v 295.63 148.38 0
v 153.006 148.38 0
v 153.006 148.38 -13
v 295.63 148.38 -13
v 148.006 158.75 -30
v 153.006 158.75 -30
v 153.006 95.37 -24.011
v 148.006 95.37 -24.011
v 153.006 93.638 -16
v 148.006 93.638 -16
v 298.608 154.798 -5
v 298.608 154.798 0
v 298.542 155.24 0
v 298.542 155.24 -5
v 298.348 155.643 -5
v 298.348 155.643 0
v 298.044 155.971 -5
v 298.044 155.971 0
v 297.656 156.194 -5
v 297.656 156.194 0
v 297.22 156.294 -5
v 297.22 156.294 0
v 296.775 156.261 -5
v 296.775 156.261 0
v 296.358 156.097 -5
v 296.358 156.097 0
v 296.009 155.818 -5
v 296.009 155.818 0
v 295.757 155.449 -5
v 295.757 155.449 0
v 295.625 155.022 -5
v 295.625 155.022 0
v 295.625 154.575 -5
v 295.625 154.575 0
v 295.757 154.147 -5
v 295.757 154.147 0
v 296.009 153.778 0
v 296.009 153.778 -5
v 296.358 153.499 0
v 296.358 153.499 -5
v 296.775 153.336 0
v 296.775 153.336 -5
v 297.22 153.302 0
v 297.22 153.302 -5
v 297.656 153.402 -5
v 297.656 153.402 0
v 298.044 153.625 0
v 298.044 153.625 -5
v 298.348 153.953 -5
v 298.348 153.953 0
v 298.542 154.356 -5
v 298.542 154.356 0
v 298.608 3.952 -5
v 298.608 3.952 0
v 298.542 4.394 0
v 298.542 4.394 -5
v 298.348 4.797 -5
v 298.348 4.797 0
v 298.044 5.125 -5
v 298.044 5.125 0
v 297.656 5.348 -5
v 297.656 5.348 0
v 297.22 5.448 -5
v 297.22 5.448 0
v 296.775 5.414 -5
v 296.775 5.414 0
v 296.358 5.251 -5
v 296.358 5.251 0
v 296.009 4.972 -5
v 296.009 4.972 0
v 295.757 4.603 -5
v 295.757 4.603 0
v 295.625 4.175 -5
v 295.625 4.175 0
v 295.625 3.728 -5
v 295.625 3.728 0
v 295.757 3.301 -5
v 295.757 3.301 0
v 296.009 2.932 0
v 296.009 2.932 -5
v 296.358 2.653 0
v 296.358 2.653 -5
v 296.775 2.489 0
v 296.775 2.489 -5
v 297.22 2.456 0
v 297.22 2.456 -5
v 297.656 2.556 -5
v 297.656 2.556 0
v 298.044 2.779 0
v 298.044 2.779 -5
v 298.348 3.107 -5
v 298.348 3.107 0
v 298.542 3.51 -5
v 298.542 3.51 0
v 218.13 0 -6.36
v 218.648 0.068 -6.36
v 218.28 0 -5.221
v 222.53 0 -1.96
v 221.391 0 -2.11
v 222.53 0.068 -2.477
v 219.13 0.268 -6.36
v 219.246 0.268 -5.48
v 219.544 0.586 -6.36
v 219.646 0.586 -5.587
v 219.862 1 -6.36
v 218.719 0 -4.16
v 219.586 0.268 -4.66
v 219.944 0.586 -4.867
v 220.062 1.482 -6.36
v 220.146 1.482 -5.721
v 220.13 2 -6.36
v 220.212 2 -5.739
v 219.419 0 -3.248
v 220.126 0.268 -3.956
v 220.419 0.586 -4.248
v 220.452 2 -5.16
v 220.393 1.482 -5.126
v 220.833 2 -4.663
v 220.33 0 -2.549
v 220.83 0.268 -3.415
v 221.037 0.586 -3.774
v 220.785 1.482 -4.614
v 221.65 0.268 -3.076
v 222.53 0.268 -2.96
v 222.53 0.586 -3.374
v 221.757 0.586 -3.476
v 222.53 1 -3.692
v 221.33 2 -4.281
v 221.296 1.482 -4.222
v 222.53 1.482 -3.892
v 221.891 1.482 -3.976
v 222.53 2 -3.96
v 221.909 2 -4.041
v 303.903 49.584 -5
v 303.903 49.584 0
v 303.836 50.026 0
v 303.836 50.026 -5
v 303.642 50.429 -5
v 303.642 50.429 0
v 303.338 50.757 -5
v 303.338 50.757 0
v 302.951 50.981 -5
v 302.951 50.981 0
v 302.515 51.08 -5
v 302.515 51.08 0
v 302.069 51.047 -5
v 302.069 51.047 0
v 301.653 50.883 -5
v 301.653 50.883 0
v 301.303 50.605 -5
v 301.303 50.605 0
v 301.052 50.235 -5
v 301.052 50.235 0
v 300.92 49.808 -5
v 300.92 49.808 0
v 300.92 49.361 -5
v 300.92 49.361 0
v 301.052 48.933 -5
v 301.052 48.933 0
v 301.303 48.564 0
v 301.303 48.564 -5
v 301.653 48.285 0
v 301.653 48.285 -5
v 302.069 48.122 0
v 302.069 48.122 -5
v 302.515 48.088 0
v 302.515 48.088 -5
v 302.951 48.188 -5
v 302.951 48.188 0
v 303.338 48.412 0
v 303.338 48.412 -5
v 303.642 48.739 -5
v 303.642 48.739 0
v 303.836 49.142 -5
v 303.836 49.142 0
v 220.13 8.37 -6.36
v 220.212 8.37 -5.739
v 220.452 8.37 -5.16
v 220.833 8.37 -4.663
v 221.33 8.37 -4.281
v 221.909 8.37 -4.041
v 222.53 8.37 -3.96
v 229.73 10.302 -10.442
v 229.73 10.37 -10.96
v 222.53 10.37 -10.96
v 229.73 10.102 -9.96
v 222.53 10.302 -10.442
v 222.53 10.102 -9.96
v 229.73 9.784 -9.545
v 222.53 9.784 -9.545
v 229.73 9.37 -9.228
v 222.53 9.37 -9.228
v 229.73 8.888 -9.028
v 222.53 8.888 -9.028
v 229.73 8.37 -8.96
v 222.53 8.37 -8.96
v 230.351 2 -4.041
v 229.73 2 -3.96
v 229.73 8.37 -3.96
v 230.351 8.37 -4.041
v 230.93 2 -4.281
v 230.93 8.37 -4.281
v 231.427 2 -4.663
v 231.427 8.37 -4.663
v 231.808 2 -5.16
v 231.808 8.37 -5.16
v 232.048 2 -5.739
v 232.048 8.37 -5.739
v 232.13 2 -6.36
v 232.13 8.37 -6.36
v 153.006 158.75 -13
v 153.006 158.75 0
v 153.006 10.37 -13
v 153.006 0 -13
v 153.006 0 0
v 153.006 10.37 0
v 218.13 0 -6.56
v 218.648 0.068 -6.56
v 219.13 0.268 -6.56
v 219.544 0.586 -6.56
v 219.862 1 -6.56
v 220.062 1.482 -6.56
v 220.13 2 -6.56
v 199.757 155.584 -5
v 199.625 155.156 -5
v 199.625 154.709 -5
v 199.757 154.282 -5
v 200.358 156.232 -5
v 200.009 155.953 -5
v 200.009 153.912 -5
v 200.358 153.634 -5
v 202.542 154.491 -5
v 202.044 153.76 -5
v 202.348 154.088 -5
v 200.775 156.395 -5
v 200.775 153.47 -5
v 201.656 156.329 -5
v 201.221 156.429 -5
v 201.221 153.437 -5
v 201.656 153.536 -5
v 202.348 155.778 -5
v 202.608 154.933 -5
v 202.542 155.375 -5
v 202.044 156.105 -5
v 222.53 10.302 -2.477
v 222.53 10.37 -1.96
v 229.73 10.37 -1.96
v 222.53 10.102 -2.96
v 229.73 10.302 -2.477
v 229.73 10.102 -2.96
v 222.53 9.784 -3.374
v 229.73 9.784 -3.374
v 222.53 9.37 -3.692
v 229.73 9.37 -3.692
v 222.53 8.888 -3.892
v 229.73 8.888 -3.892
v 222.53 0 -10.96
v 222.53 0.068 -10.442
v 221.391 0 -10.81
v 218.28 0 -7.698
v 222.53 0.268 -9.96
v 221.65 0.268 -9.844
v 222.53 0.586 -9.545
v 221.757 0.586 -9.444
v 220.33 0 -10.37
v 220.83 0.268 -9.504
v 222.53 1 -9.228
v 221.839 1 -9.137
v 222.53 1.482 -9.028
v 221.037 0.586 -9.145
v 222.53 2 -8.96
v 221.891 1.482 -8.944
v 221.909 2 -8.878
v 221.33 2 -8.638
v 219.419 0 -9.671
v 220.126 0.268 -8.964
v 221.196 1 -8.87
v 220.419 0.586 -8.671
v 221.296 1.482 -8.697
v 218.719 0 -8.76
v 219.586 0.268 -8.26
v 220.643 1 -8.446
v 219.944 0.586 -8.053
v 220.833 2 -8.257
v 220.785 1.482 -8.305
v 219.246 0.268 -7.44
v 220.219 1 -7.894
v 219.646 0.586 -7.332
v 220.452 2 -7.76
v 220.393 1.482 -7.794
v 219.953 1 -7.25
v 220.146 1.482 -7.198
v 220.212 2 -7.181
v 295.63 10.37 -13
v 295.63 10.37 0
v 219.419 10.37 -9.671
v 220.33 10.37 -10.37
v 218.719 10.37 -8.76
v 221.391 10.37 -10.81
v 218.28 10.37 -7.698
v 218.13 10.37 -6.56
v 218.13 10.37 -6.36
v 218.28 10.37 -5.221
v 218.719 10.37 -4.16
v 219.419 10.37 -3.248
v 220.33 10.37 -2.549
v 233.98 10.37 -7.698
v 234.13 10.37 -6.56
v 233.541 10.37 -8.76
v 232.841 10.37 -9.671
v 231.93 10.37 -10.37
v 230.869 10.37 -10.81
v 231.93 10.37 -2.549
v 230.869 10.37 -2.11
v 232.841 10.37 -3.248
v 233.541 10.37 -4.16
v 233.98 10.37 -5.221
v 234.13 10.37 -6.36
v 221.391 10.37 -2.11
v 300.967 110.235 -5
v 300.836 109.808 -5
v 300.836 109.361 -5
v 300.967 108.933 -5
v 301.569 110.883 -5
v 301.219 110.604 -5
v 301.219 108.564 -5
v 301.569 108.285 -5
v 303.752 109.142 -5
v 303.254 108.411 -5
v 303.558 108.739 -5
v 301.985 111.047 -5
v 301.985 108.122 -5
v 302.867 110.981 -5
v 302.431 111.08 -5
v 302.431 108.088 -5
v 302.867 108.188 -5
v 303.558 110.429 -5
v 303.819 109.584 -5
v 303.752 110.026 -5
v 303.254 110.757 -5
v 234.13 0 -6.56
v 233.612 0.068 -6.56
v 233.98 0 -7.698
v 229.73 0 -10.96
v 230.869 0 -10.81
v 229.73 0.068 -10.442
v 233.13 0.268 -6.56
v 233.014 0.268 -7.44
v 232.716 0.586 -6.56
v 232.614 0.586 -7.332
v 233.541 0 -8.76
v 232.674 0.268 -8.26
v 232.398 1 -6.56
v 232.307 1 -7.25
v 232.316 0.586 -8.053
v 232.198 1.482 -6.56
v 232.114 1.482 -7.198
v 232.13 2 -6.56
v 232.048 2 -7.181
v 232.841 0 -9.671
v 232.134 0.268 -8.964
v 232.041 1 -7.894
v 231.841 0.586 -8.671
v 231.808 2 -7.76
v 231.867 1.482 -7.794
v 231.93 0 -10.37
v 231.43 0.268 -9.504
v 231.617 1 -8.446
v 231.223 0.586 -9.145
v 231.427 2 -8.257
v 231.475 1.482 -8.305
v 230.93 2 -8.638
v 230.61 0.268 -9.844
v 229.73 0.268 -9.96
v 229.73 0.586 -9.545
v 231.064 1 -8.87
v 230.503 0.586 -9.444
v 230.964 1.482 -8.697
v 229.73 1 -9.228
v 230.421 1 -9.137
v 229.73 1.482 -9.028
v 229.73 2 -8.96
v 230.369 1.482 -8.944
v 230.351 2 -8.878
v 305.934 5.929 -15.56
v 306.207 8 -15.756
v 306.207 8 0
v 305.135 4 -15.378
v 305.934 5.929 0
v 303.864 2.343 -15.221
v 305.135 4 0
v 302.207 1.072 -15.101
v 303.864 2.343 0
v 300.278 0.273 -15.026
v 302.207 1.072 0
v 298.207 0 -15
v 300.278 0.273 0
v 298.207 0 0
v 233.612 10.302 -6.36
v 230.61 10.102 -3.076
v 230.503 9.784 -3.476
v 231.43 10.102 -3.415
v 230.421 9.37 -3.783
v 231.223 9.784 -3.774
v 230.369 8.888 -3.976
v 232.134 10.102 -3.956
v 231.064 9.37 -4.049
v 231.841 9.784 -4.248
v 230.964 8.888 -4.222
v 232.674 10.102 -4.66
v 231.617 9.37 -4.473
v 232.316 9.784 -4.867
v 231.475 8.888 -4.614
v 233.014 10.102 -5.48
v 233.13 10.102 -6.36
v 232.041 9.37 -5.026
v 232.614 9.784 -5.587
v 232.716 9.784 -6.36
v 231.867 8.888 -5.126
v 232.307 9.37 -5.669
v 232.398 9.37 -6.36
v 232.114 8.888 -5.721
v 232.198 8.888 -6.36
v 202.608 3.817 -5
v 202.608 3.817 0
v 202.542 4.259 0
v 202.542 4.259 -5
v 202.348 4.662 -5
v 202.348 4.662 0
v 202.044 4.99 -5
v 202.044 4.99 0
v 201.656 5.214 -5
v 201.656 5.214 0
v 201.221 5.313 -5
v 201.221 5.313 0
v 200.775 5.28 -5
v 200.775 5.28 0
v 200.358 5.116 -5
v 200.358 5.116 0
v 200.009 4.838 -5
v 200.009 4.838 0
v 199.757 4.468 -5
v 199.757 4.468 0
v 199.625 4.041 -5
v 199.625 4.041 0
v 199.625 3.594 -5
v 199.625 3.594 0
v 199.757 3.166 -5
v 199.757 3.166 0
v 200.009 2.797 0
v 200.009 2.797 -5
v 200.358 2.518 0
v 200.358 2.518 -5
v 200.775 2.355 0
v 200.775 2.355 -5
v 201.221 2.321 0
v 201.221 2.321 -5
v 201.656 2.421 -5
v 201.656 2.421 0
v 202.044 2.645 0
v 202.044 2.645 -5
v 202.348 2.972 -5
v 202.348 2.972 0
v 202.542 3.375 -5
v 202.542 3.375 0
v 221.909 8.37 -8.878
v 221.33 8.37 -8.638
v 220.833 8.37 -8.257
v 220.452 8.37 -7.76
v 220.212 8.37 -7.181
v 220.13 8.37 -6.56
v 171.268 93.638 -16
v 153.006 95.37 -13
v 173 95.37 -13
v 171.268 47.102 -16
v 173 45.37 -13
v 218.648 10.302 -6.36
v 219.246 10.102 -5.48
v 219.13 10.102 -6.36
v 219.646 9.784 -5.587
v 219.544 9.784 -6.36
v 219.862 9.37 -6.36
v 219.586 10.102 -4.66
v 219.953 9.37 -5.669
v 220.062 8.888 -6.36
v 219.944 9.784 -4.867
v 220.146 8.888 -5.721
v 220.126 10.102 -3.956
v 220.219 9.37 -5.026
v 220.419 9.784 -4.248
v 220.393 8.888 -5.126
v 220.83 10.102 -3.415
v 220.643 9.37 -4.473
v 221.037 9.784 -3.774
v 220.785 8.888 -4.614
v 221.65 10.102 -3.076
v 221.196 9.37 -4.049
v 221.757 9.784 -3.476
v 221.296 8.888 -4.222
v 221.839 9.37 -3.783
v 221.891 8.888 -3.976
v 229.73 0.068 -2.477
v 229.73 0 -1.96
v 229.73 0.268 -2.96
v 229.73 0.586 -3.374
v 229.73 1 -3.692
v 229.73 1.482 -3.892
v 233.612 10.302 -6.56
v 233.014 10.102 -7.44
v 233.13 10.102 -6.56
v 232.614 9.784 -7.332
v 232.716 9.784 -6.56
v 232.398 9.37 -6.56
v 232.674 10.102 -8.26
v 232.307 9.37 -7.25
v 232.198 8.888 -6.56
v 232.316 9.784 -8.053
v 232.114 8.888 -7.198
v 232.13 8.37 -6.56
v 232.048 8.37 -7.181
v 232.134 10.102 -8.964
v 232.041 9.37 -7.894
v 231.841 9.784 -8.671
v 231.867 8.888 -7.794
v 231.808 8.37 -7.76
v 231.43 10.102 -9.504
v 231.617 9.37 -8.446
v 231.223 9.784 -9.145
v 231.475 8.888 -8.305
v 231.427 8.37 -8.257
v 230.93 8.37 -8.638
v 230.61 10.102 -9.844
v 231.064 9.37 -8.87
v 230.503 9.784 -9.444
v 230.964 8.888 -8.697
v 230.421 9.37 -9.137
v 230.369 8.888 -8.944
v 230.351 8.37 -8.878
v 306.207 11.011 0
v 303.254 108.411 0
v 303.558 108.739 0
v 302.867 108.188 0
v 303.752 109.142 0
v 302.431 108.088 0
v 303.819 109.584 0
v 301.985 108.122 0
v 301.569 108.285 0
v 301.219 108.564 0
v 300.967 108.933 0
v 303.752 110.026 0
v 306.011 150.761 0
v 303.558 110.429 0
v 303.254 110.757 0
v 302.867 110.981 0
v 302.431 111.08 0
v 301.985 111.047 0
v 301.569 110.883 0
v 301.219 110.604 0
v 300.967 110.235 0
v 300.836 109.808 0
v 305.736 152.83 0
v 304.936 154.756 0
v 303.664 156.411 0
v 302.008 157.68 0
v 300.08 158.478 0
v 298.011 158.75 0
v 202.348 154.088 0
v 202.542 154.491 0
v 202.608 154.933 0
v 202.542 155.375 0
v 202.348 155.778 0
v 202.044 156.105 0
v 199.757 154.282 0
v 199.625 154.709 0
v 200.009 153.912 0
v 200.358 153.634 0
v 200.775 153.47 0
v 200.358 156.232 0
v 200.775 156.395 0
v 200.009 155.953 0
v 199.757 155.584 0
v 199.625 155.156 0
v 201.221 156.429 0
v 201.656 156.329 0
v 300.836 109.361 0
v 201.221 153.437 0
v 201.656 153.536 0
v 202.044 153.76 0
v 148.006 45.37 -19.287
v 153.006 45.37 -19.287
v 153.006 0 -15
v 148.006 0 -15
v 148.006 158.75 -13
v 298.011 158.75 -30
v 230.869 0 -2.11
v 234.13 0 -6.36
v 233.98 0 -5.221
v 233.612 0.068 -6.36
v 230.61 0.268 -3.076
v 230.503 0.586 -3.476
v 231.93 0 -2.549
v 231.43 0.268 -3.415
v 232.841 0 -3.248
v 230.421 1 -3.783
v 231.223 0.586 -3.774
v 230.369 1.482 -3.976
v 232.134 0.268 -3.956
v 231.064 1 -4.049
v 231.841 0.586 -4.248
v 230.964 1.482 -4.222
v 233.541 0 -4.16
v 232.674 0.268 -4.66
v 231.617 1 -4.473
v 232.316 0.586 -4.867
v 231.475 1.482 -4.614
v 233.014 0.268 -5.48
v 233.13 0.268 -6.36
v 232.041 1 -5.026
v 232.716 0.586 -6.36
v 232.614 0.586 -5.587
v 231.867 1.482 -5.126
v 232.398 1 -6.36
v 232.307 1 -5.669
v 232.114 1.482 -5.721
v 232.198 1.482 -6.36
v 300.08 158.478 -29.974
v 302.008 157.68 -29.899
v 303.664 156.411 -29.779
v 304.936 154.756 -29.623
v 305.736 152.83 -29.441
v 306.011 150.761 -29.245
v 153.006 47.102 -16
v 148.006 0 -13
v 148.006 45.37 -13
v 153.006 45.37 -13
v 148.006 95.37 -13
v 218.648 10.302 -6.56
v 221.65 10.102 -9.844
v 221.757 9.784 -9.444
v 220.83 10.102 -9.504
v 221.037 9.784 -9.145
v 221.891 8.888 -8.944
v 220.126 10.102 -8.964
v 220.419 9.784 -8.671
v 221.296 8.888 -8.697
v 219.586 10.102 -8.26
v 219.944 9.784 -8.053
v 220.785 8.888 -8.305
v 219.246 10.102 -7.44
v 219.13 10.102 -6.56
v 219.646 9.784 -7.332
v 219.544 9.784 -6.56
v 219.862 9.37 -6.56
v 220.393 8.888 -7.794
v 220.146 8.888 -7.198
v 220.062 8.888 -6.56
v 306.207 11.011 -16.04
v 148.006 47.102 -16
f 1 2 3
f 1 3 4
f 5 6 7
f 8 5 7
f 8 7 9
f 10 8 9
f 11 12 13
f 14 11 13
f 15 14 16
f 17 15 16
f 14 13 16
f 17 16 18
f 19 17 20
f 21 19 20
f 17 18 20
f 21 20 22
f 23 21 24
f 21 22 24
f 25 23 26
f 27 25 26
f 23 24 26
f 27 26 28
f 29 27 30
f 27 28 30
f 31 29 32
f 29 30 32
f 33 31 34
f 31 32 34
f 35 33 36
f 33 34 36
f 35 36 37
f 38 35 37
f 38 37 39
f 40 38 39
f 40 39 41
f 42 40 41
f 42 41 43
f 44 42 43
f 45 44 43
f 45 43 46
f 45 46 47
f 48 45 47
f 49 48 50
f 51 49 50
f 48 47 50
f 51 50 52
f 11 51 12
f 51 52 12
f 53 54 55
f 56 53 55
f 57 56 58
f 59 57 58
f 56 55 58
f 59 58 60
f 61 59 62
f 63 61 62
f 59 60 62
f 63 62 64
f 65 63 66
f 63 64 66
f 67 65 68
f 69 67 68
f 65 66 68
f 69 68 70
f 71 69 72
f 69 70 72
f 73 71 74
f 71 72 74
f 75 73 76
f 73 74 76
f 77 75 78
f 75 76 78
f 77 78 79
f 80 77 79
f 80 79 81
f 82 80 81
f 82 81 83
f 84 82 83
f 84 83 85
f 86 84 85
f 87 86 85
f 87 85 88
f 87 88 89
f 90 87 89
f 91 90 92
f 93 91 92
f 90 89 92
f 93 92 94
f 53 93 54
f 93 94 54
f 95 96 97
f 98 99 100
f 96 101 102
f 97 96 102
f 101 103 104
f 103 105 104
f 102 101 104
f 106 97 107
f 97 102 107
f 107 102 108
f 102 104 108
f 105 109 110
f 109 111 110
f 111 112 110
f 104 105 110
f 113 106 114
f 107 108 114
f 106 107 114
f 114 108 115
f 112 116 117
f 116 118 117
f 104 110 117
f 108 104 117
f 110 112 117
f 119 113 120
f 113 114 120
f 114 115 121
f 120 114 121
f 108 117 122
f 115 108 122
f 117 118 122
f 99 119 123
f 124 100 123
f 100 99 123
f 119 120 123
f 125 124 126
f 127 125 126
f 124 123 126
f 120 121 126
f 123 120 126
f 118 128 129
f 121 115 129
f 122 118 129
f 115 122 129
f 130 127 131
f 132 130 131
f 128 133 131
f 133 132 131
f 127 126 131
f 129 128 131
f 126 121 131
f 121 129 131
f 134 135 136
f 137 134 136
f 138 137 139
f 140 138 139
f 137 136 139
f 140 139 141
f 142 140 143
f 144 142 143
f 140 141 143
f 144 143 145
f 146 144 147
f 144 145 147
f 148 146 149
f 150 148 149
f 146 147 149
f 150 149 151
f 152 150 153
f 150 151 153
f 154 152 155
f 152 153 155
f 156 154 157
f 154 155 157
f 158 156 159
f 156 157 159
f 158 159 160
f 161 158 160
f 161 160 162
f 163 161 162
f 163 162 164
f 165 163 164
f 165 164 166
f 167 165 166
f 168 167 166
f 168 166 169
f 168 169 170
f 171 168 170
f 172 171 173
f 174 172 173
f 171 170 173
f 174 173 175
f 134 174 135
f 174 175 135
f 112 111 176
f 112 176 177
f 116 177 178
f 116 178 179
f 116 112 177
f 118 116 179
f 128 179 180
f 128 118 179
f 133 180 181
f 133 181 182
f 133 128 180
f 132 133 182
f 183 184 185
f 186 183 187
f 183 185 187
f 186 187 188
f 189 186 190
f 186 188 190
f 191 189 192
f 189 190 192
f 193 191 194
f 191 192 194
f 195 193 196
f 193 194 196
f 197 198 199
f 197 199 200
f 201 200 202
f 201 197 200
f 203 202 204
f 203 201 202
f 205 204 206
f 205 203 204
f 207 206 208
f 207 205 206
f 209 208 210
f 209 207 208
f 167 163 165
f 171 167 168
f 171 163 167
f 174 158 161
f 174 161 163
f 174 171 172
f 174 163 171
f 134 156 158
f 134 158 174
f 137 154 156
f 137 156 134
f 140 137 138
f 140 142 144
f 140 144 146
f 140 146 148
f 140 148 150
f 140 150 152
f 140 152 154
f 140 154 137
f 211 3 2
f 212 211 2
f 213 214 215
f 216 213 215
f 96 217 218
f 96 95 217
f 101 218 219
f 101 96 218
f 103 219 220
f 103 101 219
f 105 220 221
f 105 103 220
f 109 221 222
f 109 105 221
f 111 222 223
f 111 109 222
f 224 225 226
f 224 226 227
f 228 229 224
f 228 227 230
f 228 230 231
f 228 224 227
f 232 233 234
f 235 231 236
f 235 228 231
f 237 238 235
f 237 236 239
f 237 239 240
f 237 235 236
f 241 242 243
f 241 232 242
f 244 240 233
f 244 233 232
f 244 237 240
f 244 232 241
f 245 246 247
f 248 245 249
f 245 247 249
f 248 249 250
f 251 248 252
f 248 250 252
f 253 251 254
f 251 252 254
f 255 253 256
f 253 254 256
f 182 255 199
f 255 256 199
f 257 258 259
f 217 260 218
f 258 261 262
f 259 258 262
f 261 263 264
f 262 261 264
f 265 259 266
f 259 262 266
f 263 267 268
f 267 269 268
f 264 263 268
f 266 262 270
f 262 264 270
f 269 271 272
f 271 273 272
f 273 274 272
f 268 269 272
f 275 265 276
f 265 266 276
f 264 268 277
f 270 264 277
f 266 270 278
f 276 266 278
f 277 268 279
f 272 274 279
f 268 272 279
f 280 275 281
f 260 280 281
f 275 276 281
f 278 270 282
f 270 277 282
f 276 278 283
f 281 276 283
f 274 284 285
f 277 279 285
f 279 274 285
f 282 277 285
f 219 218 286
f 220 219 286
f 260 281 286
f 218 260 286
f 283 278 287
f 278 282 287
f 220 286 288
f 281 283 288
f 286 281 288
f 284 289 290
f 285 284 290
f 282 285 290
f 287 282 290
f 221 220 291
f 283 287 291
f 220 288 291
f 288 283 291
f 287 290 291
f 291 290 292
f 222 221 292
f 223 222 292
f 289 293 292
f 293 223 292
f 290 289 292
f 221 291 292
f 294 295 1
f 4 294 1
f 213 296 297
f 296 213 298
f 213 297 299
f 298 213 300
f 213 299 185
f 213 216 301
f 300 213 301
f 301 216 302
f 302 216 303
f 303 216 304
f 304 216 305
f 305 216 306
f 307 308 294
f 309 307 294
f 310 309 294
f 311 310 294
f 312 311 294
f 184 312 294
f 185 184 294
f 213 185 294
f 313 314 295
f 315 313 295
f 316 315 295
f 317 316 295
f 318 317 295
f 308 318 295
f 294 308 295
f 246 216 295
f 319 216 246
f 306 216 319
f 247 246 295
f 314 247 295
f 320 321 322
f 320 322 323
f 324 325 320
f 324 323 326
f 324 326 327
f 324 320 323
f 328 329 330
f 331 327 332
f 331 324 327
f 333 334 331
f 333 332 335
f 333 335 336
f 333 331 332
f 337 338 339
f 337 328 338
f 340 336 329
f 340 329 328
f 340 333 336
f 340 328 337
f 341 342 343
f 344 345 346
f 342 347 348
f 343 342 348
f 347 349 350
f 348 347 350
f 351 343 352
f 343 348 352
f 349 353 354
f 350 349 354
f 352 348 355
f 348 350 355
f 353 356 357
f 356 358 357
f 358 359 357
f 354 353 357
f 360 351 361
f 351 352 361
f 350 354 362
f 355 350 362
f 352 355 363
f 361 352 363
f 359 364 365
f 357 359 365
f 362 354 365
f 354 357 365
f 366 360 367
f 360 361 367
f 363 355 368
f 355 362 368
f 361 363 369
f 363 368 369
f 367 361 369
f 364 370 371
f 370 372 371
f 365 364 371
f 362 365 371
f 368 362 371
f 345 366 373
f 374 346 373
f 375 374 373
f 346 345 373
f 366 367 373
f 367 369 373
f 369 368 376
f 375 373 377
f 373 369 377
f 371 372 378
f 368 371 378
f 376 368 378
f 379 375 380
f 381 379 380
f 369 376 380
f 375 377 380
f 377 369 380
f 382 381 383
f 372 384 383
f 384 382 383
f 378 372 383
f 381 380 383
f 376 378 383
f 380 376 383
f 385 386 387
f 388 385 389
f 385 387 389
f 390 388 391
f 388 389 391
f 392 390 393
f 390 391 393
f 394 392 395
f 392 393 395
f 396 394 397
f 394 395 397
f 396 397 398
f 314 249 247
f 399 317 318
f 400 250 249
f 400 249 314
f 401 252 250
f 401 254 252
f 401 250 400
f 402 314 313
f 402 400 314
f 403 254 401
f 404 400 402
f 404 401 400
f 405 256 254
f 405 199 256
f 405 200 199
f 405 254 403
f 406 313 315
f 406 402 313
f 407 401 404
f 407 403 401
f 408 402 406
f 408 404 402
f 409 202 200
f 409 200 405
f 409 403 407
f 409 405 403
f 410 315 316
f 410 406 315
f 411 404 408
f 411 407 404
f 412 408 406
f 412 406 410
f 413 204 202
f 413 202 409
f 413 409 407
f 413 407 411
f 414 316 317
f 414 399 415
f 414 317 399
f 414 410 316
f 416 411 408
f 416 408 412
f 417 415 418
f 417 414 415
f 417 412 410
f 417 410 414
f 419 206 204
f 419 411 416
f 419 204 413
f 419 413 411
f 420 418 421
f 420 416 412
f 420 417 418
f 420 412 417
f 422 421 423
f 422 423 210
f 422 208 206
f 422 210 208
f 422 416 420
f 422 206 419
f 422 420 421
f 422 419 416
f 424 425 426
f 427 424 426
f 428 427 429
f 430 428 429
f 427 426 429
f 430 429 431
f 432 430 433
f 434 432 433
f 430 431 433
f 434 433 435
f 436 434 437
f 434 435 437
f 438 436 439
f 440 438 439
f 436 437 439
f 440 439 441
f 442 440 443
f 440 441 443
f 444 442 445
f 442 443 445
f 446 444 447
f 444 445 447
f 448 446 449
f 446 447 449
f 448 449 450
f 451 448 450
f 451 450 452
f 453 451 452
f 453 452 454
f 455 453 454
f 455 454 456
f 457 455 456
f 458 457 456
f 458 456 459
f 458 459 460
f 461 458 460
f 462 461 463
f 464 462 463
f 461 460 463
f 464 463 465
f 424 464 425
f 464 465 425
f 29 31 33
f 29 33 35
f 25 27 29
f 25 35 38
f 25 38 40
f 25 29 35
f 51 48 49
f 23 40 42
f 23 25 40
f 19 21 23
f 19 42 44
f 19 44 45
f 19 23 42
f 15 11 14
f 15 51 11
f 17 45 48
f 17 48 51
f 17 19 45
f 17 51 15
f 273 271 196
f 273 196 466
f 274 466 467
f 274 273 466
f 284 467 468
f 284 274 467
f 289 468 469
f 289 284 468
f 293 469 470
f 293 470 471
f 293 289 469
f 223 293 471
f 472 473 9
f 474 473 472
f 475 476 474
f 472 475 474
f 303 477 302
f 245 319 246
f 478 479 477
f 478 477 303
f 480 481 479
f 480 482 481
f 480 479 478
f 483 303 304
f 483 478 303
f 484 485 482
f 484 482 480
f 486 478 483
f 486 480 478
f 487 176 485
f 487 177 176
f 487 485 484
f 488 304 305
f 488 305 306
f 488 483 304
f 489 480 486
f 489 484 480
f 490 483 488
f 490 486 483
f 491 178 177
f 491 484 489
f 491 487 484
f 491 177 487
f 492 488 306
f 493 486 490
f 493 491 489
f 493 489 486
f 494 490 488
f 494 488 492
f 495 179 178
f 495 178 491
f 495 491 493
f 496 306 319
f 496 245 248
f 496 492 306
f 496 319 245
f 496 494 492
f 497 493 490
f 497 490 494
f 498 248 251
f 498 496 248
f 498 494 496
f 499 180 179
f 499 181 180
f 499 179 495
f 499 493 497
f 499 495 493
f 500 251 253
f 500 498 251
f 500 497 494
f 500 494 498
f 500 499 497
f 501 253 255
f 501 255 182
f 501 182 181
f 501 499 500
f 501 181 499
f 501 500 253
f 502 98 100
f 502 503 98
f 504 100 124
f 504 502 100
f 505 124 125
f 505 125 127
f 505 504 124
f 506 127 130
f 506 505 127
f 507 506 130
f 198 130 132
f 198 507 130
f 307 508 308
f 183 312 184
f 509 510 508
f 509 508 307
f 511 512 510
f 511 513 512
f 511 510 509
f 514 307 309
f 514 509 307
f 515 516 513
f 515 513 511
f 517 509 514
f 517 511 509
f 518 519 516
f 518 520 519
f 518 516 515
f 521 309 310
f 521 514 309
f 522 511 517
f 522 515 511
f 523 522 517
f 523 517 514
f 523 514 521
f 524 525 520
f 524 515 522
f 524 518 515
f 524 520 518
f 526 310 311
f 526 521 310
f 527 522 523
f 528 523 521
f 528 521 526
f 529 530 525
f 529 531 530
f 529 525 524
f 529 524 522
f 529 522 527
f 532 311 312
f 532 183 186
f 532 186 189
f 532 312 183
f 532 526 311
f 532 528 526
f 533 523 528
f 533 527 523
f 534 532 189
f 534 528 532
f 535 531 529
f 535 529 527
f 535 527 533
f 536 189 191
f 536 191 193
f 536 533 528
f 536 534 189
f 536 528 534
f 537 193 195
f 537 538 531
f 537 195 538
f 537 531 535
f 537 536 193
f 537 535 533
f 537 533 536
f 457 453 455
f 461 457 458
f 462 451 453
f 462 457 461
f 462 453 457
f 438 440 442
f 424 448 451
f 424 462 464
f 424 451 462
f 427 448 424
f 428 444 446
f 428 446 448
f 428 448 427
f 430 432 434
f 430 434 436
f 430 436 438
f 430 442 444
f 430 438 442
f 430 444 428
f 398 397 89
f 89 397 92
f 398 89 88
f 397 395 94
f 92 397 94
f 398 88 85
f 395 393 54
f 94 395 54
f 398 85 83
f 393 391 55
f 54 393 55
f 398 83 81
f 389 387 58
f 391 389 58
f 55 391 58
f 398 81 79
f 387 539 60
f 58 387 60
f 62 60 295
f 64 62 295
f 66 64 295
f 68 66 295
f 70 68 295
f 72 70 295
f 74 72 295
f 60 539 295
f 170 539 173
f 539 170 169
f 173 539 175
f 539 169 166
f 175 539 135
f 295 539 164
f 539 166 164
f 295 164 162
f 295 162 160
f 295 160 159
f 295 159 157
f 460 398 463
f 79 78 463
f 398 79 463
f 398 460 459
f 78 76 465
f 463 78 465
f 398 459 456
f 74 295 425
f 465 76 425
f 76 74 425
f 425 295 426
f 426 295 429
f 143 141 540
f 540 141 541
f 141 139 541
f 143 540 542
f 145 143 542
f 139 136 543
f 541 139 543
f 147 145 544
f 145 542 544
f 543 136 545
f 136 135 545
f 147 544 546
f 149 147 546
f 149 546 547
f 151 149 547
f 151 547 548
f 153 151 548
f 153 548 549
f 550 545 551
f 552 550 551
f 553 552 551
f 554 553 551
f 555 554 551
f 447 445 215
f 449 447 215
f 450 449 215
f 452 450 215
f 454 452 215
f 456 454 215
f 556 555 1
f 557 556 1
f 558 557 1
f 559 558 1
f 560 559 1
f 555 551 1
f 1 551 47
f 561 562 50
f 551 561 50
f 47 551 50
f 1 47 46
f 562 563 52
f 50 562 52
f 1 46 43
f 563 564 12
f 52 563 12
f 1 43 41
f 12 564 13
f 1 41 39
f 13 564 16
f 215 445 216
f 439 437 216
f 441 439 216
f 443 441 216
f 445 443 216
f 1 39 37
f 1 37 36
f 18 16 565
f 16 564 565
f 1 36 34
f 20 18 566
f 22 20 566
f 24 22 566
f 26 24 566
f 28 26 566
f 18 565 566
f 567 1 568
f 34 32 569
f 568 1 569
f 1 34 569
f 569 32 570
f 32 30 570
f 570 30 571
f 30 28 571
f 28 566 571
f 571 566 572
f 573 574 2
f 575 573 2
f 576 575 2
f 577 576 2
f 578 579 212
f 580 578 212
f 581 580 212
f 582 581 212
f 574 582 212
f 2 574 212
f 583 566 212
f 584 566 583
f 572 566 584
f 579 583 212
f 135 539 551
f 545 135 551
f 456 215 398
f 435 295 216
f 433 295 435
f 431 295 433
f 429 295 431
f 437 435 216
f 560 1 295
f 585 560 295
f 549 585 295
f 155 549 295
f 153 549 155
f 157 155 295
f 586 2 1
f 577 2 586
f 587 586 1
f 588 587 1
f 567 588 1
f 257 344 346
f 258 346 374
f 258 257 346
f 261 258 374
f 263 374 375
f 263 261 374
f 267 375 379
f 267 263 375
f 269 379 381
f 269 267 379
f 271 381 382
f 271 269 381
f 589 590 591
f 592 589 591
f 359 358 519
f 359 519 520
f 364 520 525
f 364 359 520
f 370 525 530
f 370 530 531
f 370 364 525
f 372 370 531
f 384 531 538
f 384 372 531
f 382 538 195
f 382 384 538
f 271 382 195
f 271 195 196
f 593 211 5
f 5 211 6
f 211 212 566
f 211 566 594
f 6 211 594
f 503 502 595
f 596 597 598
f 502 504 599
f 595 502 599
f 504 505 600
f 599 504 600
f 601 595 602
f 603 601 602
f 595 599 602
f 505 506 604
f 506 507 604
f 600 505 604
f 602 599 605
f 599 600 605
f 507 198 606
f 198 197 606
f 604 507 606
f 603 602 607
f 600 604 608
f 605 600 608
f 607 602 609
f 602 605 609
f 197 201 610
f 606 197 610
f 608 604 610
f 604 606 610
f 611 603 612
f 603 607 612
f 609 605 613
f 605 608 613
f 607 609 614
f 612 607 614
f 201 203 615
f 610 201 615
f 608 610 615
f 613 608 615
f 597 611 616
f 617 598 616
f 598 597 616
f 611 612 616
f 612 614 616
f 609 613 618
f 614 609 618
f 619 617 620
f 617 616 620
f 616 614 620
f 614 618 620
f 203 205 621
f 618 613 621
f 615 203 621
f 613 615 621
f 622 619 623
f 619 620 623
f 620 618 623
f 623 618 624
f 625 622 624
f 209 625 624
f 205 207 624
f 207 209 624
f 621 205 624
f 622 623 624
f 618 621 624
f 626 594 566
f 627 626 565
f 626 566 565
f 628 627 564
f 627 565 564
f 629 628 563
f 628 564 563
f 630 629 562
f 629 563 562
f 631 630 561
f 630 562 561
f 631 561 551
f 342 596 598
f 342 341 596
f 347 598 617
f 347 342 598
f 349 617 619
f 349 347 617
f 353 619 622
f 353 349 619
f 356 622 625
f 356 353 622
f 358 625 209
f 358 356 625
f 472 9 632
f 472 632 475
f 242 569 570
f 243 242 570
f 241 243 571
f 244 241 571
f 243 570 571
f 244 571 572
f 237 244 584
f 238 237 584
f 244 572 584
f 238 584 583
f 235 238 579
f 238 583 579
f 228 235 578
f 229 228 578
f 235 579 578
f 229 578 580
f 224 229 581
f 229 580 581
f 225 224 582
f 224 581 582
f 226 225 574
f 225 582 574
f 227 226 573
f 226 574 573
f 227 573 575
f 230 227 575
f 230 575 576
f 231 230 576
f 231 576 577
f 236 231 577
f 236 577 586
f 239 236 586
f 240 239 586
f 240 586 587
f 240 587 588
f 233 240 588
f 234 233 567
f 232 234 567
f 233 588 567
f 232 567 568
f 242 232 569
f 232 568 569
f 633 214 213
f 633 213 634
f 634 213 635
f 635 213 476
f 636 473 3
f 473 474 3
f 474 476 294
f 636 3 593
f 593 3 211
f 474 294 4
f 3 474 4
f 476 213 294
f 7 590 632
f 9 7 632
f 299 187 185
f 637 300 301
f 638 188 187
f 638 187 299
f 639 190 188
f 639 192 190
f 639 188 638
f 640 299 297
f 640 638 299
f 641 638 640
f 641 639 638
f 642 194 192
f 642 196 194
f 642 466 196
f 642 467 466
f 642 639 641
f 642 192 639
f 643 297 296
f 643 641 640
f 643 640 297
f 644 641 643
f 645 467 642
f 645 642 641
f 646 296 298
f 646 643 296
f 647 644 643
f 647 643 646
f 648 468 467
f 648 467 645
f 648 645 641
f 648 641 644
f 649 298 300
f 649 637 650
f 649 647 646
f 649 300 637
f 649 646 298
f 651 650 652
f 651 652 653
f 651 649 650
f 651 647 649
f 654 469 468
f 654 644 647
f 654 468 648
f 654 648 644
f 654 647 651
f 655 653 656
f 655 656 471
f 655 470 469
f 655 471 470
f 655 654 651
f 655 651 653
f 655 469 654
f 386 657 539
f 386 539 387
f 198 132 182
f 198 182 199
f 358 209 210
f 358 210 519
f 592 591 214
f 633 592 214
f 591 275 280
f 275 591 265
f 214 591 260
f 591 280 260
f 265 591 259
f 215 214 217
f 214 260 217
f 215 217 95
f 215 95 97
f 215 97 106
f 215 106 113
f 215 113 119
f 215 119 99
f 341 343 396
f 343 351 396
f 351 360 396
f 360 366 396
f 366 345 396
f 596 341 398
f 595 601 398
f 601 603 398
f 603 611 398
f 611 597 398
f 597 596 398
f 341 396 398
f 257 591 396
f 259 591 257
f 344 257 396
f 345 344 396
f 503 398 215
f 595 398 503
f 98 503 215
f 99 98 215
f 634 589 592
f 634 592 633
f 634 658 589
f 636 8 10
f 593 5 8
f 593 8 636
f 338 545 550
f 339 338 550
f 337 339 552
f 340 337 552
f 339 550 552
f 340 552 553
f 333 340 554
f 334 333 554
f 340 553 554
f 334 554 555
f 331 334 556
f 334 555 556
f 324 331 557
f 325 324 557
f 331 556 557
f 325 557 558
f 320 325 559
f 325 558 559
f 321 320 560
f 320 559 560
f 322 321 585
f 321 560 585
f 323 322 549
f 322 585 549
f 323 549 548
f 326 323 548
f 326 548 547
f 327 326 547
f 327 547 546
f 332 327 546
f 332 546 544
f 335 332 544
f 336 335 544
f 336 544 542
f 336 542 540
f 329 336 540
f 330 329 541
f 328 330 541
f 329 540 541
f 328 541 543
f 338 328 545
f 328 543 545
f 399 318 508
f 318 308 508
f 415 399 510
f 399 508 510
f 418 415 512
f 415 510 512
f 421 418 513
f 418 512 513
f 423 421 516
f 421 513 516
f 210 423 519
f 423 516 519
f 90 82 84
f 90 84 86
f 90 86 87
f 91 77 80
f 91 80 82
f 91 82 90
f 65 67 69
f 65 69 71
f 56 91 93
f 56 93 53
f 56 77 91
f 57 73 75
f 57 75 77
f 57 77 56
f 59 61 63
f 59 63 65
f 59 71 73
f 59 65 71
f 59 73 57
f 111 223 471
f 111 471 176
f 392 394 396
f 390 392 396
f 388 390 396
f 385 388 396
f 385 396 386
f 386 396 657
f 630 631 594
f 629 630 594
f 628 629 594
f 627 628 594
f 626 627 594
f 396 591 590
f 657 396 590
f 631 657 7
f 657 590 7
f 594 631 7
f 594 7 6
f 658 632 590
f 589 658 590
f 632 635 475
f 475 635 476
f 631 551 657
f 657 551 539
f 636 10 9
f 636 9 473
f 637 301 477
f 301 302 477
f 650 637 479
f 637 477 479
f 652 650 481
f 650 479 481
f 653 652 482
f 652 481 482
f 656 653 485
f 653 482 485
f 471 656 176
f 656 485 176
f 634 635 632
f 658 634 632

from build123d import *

# Parameters (mm, degrees)
EXTRUDE_1_DEPTH      = 30
SKETCH_2_R           = 1.5
CUT_EXTRUDE_1_DEPTH  = 5
CUT_EXTRUDE_4_DEPTH  = 307
SKETCH_3_W           = 285.26
SKETCH_3_H           = 138.01
CUT_EXTRUDE_5_DEPTH  = 13
SKETCH_12_W          = 40
SKETCH_12_H          = 50
CUT_EXTRUDE_7_DEPTH  = 3
CUT_EXTRUDE_7_DRAFT  = -30
SKETCH_9_W           = 100
SKETCH_9_H           = 80
CUT_EXTRUDE_8_DEPTH  = 3
CUT_EXTRUDE_8_DRAFT  = -30
CUT_EXTRUDE_9_DEPTH  = 11
FILLET_1_R           = 2
CUT_EXTRUDE_10_DEPTH = 11
FILLET_2_R           = 2
FILLET_3_R           = 2
FILLET_4_R           = 2
EXTRUDE_3_DEPTH      = 5
EXTRUDE_4_DEPTH      = 5


with BuildPart() as part:
    # Model → 凸台-拉伸1 (new body)
    with BuildSketch(Plane.XY):
        with BuildLine():
            Line((0, 11), (0, 150.75))
            ThreePointArc((0, 150.75), (2.343145751, 156.406854249), (8, 158.75))
            Line((8, 158.75), (298.011203897, 158.75))
            ThreePointArc((298.011203897, 158.75), (303.664092807, 156.410816811), (306.011196041, 150.761211743))
            Line((306.011196041, 150.761211743), (306.207051361, 11.011211743))
            Line((306.207051361, 11.011211743), (306.207051361, 8))
            ThreePointArc((306.207051361, 8), (303.863905611, 2.343145751), (298.207051361, 0))
            Line((298.207051361, 0), (8, 0))
            ThreePointArc((8, 0), (2.343145751, 2.343145751), (0, 8))
            Line((0, 8), (0, 11))
        make_face()
    extrude(amount=-EXTRUDE_1_DEPTH)

    # 草图2 → 切除-拉伸1 (cut)
    with BuildSketch(Plane.XY):
        with Locations((105.108569936, 3.75)):
            Circle(SKETCH_2_R)
        with Locations((9.108569936, 3.75)):
            Circle(SKETCH_2_R)
        with Locations((201.10846029, 3.817270412)):
            Circle(SKETCH_2_R)
        with Locations((297.108366012, 3.951811323)):
            Circle(SKETCH_2_R)
        with Locations((105.108569936, 155)):
            Circle(SKETCH_2_R)
        with Locations((9.108569936, 155)):
            Circle(SKETCH_2_R)
        with Locations((201.10846029, 154.932729588)):
            Circle(SKETCH_2_R)
        with Locations((297.108366012, 154.798188677)):
            Circle(SKETCH_2_R)
        with Locations((3.75, 109.375)):
            Circle(SKETCH_2_R)
        with Locations((3.75, 49.375)):
            Circle(SKETCH_2_R)
        with Locations((302.318900647, 109.584217456)):
            Circle(SKETCH_2_R)
        with Locations((302.402988717, 49.58427638)):
            Circle(SKETCH_2_R)
    extrude(amount=-CUT_EXTRUDE_1_DEPTH, mode=Mode.SUBTRACT)

    # 草图6 → 切除-拉伸4 (cut)
    with BuildSketch(Plane.ZY):
        Polygon((-30, 158.75), (-30, 0), (-15, 0), align=None)
    extrude(amount=-CUT_EXTRUDE_4_DEPTH, mode=Mode.SUBTRACT)

    # 草图3 → 切除-拉伸5 (cut)
    with BuildSketch(Plane.XY):
        with Locations((153, 79.375)):
            Rectangle(SKETCH_3_W, SKETCH_3_H)
    extrude(amount=-CUT_EXTRUDE_5_DEPTH, mode=Mode.SUBTRACT)


with BuildPart() as cut_extrude_7_tool:
    # 草图12 → 切除-拉伸7 (with draft: the straight prism first)
    with BuildSketch(Plane.XY.offset(-13)):
        with Locations((153, 70.37)):
            Rectangle(SKETCH_12_W, SKETCH_12_H)
    extrude(amount=-CUT_EXTRUDE_7_DEPTH)
    # 切除-拉伸7: the draft: its side faces are tilted about the plane it starts from
    cut_extrude_7_sides = [cut_extrude_7_tool.faces().sort_by_distance(p)[0] for p in [
        (153, 45.37, -14.5),
        (173, 70.37, -14.5),
        (153, 95.37, -14.5),
        (133, 70.37, -14.5),
    ]]
    draft(cut_extrude_7_sides, Plane.XY.offset(-13), CUT_EXTRUDE_7_DRAFT)


with BuildPart() as part_1:
    add(part.part)

    # 切除-拉伸7: cut by cut_extrude_7_tool
    add(cut_extrude_7_tool.part, mode=Mode.SUBTRACT)


with BuildPart() as cut_extrude_8_tool:
    # 草图9 → 切除-拉伸8 (with draft: the straight prism first)
    with BuildSketch(Plane.XY.offset(-13)):
        with Locations((75.37, 88.38)):
            Rectangle(SKETCH_9_W, SKETCH_9_H)
    extrude(amount=-CUT_EXTRUDE_8_DEPTH)
    # 切除-拉伸8: the draft: its side faces are tilted about the plane it starts from
    cut_extrude_8_sides = [cut_extrude_8_tool.faces().sort_by_distance(p)[0] for p in [
        (25.37, 88.38, -14.5),
        (75.37, 48.38, -14.5),
        (125.37, 88.38, -14.5),
        (75.37, 128.38, -14.5),
    ]]
    draft(cut_extrude_8_sides, Plane.XY.offset(-13), CUT_EXTRUDE_8_DRAFT)


with BuildPart() as part_2:
    add(part_1.part)

    # 切除-拉伸8: cut by cut_extrude_8_tool
    add(cut_extrude_8_tool.part, mode=Mode.SUBTRACT)

    # 草图14 → 切除-拉伸9 (cut)
    with BuildSketch(Plane.ZY):
        with BuildLine():
            Line((-5.9, 129.38), (-6.1, 129.38))
            ThreePointArc((-6.1, 129.38), (-7.797056275, 128.677056275), (-8.5, 126.98))
            Line((-8.5, 126.98), (-8.5, 120.78))
            ThreePointArc((-8.5, 120.78), (-7.797056275, 119.082943725), (-6.1, 118.38))
            Line((-6.1, 118.38), (-5.9, 118.38))
            ThreePointArc((-5.9, 118.38), (-4.202943725, 119.082943725), (-3.5, 120.78))
            Line((-3.5, 120.78), (-3.5, 126.98))
            ThreePointArc((-3.5, 126.98), (-4.202943725, 128.677056275), (-5.9, 129.38))
        make_face()
    extrude(amount=-CUT_EXTRUDE_9_DEPTH, mode=Mode.SUBTRACT)

    # 圆角1
    fillet_1_edges = [part_2.edges().sort_by_distance(p)[0] for p in [
        (0, 123.88, -3.5),
        (0, 118.38, -6),
        (0, 119.082943725, -7.797056275),
        (0, 128.677056275, -7.797056275),
        (0, 128.677056275, -4.202943725),
        (0, 129.38, -6),
        (0, 123.88, -8.5),
        (0, 119.082943725, -4.202943725),
    ]]
    fillet(fillet_1_edges, radius=FILLET_1_R)

    # 草图15 → 切除-拉伸10 (cut)
    with BuildSketch(Plane.XZ):
        with BuildLine():
            Line((222.53, -3.959687417), (229.73, -3.959687417))
            ThreePointArc((229.73, -3.959687417), (231.427056275, -4.662631142), (232.13, -6.359687417))
            Line((232.13, -6.359687417), (232.13, -6.559687417))
            ThreePointArc((232.13, -6.559687417), (231.427056275, -8.256743692), (229.73, -8.959687417))
            Line((229.73, -8.959687417), (222.53, -8.959687417))
            ThreePointArc((222.53, -8.959687417), (220.832943725, -8.256743692), (220.13, -6.559687417))
            Line((220.13, -6.559687417), (220.13, -6.359687417))
            ThreePointArc((220.13, -6.359687417), (220.832943725, -4.662631142), (222.53, -3.959687417))
        make_face()
    extrude(amount=-CUT_EXTRUDE_10_DEPTH, mode=Mode.SUBTRACT)

    # 圆角2
    fillet_2_edges = [part_2.edges().sort_by_distance(p)[0] for p in [
        (226.13, 0, -3.959687417),
        (232.13, 0, -6.459687417),
        (231.427056275, 0, -8.256743692),
        (220.832943725, 0, -4.662631142),
        (220.13, 0, -6.459687417),
        (220.832943725, 0, -8.256743692),
        (226.13, 0, -8.959687417),
        (231.427056275, 0, -4.662631142),
    ]]
    fillet(fillet_2_edges, radius=FILLET_2_R)

    # 圆角3
    fillet_3_edges = [part_2.edges().sort_by_distance(p)[0] for p in [
        (10.37, 129.38, -6),
        (10.37, 128.677056275, -7.797056275),
        (10.37, 123.88, -8.5),
        (10.37, 119.082943725, -7.797056275),
        (10.37, 118.38, -6),
        (10.37, 119.082943725, -4.202943725),
        (10.37, 123.88, -3.5),
        (10.37, 128.677056275, -4.202943725),
    ]]
    fillet(fillet_3_edges, radius=FILLET_3_R)

    # 圆角4
    fillet_4_edges = [part_2.edges().sort_by_distance(p)[0] for p in [
        (220.13, 10.37, -6.459687417),
        (220.832943725, 10.37, -8.256743692),
        (226.13, 10.37, -8.959687417),
        (231.427056275, 10.37, -8.256743692),
        (232.13, 10.37, -6.459687417),
        (231.427056275, 10.37, -4.662631142),
        (226.13, 10.37, -3.959687417),
        (220.832943725, 10.37, -4.662631142),
    ]]
    fillet(fillet_4_edges, radius=FILLET_4_R)


with BuildPart() as body_2:
    # Split Bodies 1: the piece on the far side of the plane
    add(part_2.part)
    split(bisect_by=Plane(origin=(153.005601949, 0, 0), x_dir=(0, 0, 1), z_dir=(1, 0, 0)), keep=Keep.BOTTOM)


with BuildPart() as part_3:
    add(part_2.part)

    # Split Bodies 1
    split(bisect_by=Plane(origin=(153.005601949, 0, 0), x_dir=(0, 0, 1), z_dir=(1, 0, 0)), keep=Keep.TOP)

    # 草图19 → 凸台-拉伸3 (add)
    with BuildSketch(Plane.ZY.offset(-153.005601949)):
        Polygon((-19.286929134, 45.37), (-15, 0), (-13, 0), (-13, 10.37), (-13, 45.37), (-16, 47.102050808), align=None)
    extrude(amount=EXTRUDE_3_DEPTH)

    # 草图19<5> → 凸台-拉伸4 (add)
    with BuildSketch(Plane.ZY.offset(-153.005601949)):
        Polygon((-30, 158.75), (-24.011338583, 95.37), (-16, 93.637949192), (-13, 95.37), (-13, 148.38), (-13, 158.75), align=None)
        Polygon((-19.286929134, 45.37), (-15, 0), (-13, 0), (-13, 10.37), (-13, 45.37), (-16, 47.102050808), align=None)
    extrude(amount=EXTRUDE_4_DEPTH)


solid = part_3.part
